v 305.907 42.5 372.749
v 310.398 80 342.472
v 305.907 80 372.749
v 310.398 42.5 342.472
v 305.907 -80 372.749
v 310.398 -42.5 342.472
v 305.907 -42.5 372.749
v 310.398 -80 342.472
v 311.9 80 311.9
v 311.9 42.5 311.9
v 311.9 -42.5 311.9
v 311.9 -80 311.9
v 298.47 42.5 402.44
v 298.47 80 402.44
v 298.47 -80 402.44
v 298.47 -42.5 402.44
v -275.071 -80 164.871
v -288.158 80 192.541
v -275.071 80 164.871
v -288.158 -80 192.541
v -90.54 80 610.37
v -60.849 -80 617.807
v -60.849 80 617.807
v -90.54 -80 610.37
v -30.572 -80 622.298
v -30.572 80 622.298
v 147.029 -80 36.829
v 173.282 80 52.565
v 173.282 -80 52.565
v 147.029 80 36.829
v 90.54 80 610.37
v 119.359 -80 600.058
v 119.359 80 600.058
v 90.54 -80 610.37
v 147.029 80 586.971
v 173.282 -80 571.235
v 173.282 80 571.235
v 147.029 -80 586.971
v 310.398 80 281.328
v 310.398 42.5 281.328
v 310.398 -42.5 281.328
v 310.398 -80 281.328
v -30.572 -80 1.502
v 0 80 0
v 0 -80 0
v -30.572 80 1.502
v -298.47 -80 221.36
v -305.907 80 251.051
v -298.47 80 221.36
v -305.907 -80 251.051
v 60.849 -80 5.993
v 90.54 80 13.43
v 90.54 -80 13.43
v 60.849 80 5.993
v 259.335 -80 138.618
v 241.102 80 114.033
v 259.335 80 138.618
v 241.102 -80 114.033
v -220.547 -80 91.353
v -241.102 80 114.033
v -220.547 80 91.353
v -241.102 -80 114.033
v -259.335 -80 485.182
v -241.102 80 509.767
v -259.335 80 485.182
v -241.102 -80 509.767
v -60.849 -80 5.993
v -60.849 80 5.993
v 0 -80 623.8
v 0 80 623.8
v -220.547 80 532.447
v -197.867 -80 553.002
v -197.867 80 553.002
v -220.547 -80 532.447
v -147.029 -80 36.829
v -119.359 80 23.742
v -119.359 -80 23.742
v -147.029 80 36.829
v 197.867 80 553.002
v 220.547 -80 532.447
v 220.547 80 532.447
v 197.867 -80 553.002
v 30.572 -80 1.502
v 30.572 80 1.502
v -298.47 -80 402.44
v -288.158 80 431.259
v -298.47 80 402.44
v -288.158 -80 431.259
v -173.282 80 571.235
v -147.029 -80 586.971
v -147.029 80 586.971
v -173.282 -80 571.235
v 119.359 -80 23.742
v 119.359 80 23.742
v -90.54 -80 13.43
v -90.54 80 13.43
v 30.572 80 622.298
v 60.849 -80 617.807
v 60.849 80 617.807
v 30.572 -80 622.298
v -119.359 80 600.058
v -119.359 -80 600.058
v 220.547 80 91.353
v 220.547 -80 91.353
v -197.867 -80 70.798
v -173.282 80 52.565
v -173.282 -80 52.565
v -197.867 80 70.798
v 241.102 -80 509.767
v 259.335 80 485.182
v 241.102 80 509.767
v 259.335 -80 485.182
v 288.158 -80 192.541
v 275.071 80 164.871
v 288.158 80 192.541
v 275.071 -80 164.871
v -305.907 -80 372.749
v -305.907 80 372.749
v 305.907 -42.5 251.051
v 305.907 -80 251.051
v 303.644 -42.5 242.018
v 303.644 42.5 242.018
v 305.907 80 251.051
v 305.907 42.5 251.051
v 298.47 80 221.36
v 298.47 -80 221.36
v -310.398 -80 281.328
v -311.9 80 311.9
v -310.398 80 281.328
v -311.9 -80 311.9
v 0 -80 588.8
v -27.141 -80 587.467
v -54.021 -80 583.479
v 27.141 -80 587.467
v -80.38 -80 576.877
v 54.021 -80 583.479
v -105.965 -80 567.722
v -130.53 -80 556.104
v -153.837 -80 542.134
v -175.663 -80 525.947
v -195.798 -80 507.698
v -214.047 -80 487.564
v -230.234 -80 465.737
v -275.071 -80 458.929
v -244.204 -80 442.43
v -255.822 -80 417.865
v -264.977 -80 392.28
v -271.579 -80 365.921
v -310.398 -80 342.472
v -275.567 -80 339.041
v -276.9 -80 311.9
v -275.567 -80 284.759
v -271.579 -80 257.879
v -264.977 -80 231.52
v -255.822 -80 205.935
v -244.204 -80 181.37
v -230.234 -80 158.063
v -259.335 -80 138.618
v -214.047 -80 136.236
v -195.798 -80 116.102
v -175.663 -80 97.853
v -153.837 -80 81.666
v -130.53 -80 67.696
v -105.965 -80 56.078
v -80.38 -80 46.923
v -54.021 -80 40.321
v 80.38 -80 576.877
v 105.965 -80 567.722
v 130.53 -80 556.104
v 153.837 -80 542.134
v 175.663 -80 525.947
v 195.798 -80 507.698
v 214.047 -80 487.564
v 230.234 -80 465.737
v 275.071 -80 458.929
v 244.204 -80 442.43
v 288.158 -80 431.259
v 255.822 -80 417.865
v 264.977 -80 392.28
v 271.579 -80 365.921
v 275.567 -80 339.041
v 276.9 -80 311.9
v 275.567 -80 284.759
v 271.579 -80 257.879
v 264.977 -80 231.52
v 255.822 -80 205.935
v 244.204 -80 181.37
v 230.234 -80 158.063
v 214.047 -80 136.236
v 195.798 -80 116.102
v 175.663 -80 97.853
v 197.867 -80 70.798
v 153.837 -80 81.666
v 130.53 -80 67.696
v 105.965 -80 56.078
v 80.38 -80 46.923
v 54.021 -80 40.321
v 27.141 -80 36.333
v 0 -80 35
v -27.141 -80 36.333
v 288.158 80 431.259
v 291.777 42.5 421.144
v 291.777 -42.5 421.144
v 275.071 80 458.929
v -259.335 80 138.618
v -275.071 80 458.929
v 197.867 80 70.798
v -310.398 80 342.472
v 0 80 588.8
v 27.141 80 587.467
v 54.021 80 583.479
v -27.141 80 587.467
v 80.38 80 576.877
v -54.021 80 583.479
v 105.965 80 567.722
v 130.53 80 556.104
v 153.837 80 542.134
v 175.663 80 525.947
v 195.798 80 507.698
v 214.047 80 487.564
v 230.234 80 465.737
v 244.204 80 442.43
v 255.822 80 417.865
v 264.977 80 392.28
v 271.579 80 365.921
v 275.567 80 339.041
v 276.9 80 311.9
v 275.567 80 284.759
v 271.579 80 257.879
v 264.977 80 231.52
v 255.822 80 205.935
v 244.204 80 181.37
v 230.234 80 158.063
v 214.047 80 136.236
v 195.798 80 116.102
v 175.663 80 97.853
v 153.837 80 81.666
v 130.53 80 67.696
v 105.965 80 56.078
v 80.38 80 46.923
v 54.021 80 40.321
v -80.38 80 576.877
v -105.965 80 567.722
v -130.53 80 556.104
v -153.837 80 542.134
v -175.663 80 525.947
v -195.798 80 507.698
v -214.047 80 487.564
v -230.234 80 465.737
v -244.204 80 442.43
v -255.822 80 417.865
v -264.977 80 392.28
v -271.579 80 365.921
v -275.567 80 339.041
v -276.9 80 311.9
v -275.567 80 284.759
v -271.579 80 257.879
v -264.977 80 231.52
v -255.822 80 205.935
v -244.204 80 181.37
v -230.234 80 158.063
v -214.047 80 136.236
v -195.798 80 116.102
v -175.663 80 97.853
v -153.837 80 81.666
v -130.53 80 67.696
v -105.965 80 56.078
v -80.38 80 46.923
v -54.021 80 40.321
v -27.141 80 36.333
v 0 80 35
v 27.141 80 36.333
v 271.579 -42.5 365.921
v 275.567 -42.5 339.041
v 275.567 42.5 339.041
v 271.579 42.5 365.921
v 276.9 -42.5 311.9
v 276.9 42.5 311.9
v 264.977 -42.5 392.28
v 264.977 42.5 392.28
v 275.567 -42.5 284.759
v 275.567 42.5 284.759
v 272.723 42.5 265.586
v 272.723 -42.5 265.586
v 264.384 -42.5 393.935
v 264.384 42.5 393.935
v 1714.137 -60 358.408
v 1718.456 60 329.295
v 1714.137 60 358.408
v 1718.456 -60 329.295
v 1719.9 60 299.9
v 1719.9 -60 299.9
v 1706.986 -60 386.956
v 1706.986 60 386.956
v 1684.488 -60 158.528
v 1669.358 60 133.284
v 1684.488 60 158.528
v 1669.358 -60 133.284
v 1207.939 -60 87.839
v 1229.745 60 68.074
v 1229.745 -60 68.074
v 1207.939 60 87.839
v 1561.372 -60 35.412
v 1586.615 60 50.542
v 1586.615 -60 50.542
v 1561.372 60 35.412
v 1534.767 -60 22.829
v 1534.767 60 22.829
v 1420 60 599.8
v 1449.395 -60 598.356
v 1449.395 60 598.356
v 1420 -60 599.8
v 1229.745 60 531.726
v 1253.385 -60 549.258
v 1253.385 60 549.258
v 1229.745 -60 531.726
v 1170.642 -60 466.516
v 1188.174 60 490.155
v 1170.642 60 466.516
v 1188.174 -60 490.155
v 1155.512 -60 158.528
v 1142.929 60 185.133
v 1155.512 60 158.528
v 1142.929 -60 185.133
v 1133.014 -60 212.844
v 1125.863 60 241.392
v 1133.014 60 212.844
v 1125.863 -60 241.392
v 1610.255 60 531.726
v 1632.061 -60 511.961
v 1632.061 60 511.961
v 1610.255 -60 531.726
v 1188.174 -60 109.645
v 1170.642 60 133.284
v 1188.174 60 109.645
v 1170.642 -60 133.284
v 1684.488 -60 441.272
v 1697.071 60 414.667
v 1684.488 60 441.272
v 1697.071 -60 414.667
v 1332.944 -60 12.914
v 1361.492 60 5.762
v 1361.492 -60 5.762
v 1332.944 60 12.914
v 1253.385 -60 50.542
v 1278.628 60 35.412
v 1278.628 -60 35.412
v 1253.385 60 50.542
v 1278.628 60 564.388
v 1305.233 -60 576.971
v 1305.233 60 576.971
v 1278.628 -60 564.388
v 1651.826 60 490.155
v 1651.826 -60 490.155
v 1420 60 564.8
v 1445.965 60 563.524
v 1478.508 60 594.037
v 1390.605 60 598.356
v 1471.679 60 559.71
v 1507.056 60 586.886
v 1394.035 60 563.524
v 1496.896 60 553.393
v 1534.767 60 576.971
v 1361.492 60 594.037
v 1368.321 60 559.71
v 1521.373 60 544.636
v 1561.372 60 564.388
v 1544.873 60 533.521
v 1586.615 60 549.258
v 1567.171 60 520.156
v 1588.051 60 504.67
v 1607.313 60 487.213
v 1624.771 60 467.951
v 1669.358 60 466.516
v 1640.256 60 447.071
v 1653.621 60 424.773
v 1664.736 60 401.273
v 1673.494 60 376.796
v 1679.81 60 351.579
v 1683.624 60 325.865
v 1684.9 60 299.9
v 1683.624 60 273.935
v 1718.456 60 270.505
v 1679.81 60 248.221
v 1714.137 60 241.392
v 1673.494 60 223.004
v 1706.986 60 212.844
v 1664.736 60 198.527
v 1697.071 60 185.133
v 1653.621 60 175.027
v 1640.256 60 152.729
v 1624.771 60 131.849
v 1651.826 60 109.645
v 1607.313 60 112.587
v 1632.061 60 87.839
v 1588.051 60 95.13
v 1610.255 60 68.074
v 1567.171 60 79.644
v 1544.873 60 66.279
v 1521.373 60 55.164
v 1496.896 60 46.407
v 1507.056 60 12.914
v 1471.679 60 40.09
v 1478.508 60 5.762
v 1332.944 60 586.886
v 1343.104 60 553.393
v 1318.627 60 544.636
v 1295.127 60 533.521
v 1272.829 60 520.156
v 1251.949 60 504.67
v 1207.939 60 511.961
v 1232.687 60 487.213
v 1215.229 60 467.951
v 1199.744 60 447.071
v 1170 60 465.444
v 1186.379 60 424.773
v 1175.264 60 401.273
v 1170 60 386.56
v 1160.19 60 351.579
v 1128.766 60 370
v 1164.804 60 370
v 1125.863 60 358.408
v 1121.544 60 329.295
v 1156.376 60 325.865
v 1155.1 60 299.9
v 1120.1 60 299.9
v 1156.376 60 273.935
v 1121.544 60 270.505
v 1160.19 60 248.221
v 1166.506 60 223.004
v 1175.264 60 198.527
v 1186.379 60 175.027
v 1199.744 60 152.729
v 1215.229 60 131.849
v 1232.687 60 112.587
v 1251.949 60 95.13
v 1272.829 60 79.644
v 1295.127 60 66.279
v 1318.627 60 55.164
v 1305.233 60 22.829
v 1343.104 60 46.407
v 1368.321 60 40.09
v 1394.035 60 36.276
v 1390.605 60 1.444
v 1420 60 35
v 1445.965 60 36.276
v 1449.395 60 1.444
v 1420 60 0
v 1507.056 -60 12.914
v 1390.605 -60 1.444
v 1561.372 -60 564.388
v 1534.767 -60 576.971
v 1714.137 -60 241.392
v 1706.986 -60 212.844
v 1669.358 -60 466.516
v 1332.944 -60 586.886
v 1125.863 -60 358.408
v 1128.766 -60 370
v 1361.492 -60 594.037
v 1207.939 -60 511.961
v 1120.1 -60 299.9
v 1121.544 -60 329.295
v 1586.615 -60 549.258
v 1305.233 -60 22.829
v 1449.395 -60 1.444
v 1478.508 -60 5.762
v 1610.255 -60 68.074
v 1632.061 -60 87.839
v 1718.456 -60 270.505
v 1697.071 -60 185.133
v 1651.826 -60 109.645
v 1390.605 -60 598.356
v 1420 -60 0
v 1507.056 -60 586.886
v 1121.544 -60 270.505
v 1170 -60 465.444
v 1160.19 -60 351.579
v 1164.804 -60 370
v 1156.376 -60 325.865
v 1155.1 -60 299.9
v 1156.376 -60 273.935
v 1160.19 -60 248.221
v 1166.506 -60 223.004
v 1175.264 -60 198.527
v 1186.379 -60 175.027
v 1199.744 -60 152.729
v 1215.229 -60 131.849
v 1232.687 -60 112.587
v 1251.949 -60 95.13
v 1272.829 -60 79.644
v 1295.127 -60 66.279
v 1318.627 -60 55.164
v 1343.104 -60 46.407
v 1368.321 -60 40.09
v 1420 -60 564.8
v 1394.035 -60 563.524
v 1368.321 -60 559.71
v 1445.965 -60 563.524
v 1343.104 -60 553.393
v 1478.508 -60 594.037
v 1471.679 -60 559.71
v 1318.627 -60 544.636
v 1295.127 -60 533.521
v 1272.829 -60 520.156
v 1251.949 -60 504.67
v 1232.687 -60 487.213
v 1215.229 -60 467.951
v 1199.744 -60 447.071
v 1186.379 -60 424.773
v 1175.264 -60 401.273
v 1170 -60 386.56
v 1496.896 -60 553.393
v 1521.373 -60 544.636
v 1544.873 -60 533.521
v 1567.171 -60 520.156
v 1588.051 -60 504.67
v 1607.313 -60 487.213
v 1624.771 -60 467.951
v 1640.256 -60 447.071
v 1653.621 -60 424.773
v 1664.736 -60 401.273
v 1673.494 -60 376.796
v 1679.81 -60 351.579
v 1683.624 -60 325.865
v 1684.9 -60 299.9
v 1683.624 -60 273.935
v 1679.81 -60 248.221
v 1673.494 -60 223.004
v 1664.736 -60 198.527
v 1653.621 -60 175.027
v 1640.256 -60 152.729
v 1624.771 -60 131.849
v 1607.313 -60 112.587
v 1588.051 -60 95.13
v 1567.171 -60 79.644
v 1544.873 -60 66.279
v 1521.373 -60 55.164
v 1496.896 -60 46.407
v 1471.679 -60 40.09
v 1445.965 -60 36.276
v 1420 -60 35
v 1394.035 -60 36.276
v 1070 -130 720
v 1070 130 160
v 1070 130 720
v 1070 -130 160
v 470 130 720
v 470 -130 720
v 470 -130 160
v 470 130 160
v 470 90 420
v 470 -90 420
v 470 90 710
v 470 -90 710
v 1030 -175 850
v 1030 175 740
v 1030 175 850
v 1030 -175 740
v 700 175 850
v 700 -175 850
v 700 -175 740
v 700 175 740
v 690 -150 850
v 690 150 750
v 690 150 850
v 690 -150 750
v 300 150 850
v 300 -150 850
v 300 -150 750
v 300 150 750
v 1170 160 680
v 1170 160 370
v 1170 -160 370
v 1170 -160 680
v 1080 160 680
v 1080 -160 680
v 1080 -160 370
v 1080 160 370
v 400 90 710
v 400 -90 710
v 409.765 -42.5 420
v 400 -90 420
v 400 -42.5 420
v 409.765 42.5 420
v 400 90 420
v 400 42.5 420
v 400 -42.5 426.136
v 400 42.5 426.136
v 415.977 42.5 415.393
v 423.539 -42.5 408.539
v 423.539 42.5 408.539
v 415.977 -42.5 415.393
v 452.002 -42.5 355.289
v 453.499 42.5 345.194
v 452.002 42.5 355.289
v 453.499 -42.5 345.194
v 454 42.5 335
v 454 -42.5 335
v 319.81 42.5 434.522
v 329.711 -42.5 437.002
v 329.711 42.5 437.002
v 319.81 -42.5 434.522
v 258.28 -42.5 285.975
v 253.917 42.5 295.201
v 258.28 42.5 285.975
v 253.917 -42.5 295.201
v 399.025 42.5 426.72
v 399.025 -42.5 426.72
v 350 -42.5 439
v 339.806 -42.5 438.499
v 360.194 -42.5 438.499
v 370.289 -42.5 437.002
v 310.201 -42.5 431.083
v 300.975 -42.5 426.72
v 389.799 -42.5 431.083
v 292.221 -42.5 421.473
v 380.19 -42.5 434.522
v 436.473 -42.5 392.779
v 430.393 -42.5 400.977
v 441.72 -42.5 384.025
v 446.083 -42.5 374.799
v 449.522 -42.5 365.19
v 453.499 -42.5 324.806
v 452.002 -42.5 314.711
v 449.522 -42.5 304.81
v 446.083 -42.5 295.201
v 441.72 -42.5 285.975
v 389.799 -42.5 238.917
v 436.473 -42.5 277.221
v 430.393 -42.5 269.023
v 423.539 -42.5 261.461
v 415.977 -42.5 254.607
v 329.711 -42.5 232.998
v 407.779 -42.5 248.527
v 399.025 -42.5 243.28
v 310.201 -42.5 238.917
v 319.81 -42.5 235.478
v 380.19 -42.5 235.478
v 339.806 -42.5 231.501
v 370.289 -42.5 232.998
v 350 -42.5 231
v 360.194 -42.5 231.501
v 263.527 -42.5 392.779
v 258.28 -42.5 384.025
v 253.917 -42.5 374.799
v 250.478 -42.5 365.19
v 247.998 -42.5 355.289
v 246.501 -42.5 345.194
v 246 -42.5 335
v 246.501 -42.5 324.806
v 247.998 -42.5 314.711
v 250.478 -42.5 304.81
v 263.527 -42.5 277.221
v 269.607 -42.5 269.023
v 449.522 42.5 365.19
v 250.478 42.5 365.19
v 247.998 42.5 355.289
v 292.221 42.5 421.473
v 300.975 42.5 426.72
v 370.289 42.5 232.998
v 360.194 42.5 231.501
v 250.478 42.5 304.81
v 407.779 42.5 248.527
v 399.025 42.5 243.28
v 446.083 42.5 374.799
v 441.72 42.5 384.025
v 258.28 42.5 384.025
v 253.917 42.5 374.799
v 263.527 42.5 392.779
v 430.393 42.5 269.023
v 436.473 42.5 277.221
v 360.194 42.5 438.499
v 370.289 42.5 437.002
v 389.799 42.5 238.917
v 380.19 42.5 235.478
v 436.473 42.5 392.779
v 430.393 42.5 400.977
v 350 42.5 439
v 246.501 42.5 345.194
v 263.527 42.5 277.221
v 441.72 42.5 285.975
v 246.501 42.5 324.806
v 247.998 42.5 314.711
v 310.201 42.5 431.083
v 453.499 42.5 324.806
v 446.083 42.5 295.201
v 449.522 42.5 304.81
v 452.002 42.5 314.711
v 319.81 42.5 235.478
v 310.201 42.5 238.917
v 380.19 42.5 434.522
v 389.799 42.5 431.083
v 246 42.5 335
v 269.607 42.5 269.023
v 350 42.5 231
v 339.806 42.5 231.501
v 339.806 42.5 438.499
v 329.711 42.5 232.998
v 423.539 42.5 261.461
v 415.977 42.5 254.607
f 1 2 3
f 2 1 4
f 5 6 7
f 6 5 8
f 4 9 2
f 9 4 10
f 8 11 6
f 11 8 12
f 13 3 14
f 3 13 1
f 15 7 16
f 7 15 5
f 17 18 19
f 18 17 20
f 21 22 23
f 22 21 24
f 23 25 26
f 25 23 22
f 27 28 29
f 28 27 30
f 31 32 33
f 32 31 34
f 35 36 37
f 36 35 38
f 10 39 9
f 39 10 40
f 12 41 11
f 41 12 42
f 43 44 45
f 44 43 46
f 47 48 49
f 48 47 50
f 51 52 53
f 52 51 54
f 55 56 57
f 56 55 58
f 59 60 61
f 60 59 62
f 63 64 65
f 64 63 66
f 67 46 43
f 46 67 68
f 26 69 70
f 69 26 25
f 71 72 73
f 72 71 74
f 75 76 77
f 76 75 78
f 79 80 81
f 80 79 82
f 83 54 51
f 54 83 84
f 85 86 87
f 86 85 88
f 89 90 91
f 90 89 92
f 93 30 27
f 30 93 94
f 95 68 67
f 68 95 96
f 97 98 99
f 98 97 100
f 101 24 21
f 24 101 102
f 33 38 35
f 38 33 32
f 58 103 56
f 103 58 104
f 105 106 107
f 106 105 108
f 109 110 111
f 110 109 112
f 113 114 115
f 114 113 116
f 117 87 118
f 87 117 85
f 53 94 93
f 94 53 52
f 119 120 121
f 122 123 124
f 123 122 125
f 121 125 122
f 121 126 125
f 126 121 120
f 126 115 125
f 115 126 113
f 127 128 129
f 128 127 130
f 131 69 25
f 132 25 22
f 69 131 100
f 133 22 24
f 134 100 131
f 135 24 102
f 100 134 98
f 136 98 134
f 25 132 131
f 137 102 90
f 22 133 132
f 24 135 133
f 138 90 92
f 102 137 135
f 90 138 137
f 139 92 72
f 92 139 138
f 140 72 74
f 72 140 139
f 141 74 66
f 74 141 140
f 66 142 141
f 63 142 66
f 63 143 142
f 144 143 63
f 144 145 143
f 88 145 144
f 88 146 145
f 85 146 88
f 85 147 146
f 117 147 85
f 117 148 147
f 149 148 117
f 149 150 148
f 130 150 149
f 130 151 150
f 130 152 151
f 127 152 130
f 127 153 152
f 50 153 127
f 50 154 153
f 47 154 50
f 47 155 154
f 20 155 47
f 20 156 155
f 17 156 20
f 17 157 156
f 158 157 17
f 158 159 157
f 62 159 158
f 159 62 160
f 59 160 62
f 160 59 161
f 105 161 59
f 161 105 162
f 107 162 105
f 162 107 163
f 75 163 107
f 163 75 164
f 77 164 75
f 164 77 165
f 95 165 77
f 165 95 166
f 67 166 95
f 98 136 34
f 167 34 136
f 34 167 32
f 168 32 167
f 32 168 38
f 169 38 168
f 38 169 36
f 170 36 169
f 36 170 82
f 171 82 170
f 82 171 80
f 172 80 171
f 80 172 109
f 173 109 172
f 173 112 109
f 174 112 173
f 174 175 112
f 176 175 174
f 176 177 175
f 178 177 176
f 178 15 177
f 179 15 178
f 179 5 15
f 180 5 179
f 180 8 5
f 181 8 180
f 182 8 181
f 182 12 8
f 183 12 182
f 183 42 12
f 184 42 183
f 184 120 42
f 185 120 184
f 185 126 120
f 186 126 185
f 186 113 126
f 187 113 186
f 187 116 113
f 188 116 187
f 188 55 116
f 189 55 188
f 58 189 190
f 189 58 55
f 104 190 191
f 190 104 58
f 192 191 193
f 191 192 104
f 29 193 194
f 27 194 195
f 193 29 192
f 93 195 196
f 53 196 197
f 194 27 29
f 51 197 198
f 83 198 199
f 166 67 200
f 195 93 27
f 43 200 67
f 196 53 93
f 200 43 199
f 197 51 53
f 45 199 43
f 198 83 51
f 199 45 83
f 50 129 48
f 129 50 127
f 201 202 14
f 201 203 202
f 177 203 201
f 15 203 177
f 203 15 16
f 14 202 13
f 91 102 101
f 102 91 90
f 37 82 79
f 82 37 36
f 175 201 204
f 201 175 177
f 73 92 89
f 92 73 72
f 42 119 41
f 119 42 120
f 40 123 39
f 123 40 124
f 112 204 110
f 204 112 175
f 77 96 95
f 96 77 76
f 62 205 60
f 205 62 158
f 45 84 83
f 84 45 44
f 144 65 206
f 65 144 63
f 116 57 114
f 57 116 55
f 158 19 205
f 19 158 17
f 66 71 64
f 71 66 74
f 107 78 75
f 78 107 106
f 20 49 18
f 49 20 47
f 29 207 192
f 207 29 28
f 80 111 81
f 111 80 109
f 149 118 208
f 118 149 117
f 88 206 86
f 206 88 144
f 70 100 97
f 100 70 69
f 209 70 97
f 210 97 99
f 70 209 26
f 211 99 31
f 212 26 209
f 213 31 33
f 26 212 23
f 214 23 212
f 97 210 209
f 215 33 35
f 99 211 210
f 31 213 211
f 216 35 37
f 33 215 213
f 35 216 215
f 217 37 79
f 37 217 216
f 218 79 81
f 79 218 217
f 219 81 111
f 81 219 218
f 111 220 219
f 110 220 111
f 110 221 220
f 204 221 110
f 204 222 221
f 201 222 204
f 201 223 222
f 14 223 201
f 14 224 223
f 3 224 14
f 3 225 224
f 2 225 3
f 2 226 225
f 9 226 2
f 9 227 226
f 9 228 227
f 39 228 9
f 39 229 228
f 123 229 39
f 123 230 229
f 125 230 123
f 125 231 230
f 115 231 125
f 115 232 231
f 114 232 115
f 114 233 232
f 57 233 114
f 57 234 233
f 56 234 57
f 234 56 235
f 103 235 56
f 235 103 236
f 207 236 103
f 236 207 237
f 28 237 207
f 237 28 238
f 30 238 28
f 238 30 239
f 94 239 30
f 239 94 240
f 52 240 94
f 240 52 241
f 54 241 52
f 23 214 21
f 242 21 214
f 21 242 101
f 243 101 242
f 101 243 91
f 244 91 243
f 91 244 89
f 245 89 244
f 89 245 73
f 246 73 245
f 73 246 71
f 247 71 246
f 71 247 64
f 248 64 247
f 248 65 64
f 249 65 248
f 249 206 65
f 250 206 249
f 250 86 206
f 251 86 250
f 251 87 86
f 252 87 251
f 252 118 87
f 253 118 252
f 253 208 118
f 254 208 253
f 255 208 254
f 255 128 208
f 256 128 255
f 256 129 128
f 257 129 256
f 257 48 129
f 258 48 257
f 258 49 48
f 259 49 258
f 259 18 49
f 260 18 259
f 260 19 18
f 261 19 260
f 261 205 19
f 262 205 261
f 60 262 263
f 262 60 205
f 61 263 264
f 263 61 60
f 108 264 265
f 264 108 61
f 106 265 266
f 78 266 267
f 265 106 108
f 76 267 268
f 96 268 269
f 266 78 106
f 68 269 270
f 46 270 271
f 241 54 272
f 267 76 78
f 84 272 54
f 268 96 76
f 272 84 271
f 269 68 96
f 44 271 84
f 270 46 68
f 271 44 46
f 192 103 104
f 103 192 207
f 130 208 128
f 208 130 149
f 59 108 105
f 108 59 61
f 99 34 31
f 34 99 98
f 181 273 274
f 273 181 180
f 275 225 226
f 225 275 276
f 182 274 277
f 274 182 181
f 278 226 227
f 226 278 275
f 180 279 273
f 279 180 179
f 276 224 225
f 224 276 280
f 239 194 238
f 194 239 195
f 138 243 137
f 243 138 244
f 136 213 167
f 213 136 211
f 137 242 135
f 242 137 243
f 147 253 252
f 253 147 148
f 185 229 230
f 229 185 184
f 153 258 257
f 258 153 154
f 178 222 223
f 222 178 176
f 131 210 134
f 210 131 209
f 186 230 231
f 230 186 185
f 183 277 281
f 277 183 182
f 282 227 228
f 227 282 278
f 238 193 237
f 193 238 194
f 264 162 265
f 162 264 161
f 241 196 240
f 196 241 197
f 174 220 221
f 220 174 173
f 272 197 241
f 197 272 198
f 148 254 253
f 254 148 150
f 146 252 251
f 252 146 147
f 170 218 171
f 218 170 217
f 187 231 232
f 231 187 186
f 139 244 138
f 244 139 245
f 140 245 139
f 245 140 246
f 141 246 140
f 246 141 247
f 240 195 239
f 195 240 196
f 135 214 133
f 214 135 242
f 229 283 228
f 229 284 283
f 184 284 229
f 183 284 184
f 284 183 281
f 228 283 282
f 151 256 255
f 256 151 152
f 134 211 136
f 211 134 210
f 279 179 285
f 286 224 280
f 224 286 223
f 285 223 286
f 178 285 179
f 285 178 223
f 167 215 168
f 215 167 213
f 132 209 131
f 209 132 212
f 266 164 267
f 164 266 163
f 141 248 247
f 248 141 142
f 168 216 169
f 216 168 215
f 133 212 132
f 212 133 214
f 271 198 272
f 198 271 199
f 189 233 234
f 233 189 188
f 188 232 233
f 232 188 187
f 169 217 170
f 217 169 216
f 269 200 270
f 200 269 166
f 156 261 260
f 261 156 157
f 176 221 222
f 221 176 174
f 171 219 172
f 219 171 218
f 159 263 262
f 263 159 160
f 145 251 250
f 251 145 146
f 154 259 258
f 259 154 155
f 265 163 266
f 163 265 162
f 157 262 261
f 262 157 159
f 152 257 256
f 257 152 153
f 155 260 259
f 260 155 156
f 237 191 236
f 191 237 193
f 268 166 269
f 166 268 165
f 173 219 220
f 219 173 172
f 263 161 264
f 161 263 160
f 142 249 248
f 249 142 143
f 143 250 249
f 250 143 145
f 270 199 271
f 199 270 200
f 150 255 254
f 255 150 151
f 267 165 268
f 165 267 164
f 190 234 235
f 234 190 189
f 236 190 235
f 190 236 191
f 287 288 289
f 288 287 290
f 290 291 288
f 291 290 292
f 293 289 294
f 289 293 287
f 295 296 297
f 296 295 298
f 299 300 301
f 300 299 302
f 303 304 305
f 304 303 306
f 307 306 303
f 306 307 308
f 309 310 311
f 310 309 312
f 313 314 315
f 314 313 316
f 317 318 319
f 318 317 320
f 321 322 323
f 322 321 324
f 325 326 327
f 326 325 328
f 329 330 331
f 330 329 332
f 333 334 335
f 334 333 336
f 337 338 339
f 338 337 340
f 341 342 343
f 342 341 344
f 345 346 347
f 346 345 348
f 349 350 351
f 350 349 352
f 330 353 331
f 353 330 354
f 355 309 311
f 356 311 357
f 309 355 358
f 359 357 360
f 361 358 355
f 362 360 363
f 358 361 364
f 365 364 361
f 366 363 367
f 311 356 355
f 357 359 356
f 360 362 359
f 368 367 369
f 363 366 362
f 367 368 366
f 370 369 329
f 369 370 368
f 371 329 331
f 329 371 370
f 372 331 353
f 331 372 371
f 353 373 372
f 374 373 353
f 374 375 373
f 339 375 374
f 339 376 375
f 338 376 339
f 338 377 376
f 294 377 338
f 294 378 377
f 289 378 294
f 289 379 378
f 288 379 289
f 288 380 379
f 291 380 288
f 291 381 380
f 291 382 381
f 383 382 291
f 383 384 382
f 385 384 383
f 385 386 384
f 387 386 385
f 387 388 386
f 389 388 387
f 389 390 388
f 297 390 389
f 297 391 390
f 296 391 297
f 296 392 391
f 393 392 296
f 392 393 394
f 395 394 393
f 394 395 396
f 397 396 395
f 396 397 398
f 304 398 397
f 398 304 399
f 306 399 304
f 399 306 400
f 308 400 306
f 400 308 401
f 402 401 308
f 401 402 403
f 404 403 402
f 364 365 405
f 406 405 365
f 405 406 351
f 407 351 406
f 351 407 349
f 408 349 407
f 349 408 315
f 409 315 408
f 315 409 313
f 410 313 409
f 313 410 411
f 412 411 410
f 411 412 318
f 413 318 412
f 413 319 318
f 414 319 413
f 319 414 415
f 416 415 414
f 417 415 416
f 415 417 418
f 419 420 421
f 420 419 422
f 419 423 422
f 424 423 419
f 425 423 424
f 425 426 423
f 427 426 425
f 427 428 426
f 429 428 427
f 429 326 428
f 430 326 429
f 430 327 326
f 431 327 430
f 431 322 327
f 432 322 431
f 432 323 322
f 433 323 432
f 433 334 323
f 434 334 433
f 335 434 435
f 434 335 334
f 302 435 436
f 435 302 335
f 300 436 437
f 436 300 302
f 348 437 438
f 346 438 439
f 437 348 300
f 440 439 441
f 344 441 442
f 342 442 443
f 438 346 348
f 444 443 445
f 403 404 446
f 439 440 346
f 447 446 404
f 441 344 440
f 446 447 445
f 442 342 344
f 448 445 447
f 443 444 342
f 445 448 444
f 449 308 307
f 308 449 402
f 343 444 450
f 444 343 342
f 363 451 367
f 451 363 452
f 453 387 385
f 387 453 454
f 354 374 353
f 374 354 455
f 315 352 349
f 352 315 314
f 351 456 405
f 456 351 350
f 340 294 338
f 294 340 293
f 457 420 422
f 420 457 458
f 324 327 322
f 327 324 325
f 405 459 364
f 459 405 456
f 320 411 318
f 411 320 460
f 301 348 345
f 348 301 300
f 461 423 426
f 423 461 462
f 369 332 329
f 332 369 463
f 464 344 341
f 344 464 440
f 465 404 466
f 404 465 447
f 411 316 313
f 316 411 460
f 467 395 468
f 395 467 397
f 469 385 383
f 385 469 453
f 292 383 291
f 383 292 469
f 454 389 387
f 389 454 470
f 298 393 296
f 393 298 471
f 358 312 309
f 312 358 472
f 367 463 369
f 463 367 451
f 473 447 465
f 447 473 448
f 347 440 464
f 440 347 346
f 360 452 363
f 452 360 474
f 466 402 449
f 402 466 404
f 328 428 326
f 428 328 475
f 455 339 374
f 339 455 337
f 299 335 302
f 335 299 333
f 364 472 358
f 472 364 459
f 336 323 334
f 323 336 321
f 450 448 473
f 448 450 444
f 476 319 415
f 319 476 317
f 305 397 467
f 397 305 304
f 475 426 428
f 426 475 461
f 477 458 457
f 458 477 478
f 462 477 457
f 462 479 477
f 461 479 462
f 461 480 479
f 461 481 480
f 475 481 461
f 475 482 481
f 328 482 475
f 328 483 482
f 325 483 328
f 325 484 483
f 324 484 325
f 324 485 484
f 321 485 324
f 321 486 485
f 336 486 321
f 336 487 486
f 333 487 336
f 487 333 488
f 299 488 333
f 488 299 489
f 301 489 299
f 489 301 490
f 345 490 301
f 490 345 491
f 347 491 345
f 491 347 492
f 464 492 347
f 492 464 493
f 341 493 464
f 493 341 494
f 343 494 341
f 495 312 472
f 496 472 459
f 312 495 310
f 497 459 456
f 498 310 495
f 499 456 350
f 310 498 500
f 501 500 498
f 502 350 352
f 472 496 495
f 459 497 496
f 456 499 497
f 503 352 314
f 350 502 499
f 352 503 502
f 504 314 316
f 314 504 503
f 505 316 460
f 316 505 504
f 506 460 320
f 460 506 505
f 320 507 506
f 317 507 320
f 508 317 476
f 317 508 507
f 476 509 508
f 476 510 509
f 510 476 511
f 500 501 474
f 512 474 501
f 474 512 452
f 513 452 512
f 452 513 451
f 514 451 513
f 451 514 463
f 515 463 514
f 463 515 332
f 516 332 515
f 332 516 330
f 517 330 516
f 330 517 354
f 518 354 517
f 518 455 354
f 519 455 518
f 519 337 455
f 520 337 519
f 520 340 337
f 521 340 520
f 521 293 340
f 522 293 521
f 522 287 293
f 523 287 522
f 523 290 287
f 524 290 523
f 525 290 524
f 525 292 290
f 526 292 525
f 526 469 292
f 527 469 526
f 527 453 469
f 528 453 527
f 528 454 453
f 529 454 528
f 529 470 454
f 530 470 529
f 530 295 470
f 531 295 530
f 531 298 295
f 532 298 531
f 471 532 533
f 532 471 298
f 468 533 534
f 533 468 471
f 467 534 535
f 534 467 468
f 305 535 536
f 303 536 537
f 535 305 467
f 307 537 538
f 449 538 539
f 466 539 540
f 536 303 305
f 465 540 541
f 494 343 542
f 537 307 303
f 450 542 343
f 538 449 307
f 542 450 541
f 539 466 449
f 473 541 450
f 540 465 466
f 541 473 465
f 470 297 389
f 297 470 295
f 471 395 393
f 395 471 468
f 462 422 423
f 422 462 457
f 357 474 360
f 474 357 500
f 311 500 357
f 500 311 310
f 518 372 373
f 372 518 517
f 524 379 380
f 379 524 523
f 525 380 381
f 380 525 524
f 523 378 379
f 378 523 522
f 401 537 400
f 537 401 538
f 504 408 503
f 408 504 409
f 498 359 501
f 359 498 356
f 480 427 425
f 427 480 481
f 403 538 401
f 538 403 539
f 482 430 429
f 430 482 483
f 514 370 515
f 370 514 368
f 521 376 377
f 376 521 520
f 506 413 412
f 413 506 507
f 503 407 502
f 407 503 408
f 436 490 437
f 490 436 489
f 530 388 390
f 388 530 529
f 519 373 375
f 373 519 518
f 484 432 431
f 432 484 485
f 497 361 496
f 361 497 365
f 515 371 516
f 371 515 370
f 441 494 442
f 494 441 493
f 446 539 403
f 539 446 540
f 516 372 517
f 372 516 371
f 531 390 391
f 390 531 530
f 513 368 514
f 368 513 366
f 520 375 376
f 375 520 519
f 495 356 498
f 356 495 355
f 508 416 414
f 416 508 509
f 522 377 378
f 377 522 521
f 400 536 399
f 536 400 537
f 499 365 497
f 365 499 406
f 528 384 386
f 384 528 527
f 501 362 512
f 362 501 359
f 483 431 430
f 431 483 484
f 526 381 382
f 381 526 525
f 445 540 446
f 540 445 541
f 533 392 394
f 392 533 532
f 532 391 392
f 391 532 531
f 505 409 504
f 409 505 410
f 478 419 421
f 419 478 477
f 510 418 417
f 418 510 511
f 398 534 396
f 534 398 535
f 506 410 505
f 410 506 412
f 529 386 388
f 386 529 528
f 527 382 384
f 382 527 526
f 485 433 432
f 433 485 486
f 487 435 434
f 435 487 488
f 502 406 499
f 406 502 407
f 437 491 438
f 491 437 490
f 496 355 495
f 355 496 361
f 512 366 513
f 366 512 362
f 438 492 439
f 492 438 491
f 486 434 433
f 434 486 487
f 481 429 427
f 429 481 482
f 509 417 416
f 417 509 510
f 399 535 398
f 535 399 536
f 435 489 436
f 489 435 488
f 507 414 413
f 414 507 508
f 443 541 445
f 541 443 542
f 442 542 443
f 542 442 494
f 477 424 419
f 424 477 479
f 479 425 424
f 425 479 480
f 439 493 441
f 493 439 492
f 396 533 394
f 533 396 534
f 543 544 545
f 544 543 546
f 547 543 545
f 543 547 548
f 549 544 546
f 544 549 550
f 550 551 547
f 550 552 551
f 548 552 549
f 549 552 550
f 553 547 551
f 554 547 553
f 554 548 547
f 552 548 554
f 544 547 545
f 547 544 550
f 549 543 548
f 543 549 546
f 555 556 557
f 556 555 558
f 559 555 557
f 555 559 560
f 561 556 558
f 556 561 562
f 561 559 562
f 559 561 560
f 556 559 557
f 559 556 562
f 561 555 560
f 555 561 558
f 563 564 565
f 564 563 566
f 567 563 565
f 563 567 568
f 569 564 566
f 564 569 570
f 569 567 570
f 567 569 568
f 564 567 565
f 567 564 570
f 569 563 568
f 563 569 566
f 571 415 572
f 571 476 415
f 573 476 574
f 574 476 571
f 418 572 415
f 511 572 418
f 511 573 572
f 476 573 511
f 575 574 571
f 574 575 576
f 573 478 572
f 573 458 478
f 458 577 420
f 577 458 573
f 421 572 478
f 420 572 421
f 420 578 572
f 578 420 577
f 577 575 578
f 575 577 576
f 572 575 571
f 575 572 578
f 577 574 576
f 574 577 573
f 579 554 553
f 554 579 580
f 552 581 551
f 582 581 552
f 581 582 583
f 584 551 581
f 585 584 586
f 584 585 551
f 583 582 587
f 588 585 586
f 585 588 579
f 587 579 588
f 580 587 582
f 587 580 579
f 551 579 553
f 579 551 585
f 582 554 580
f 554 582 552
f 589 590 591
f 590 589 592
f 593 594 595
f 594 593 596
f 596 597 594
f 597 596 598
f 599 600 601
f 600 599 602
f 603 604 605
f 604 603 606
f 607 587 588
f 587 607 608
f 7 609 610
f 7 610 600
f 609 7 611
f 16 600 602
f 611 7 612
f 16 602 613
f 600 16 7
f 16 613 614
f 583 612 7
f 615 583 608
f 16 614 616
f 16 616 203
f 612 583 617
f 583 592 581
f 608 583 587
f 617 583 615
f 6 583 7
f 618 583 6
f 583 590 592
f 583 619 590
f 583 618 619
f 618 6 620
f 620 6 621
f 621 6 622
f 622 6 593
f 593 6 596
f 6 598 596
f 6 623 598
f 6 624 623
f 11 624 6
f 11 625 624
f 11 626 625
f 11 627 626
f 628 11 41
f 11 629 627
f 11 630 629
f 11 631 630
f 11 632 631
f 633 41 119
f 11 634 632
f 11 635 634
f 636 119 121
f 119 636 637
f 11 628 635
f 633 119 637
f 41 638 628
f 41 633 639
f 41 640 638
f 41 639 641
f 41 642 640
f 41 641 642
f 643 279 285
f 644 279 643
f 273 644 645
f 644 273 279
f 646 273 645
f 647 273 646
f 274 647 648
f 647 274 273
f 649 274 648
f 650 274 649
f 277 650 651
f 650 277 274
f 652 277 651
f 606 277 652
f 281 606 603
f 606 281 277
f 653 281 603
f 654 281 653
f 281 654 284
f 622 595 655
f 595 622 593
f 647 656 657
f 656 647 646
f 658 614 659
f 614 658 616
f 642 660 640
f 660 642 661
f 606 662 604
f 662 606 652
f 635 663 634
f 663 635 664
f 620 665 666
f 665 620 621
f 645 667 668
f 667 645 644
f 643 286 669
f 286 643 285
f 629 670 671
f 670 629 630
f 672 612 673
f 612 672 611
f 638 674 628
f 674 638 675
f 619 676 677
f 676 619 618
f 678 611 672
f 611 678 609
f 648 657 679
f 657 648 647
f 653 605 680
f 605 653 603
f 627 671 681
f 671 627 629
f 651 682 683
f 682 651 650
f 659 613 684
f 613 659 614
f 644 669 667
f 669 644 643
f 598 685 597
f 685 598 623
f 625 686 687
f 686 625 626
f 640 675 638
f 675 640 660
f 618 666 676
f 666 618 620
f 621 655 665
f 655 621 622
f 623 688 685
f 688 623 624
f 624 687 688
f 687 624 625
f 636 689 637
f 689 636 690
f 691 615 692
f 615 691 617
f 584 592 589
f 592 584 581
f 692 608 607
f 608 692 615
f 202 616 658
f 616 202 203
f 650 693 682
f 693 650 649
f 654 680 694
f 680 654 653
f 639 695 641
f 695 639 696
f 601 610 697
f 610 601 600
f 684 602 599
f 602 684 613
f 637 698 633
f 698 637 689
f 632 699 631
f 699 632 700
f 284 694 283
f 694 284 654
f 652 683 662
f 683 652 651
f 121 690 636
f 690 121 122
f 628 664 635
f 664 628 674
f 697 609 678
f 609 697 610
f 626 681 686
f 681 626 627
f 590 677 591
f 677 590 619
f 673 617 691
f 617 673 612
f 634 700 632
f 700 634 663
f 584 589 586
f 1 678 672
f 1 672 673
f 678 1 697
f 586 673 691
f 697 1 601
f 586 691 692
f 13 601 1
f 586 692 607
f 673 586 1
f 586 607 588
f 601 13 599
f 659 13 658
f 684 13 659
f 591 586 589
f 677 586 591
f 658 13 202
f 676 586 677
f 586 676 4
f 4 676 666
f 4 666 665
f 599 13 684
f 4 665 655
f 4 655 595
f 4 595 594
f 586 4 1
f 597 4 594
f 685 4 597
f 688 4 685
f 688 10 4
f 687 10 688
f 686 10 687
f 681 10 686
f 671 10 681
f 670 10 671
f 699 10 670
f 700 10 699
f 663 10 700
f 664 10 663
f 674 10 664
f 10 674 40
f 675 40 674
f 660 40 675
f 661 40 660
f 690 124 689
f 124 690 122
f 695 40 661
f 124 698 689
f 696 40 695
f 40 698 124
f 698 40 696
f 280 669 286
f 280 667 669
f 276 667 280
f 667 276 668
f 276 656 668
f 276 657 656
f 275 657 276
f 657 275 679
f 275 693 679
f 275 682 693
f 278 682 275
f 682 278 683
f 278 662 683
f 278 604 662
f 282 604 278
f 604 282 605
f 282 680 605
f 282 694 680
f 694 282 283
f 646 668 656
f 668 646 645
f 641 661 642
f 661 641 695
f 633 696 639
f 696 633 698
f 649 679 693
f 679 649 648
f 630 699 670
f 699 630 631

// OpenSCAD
// B0 packaging reservations, mm. NOT fabrication CAD. Generated by build-development-model.py.
$fn=64;
module box(p,s,c){color(c,0.55) translate(p) cube(s);}
module wheel(x,z,w,r){color([0.12,0.15,0.19]) translate([x,w/2,z]) rotate([90,0,0]) difference(){cylinder(h=w,r=r);translate([0,0,-1]) cylinder(h=w+2,r=r-35);}}
wheel(0,311.9,160,311.9); wheel(1420,299.9,120,299.9);
// PKG01: Battery reservation; Earlier 87.36 L reservation; not a validated pack
box([470,-130,160],[600,260,560],[0.9411764705882353, 0.7019607843137254, 0.30980392156862746]);
// PKG02: Inverter reservation; Body plus installation allowance; orientation speculative
box([700,-175,740],[330,350,110],[0.396078431372549, 0.7137254901960784, 0.8588235294117647]);
// PKG03: OBC reservation; Compact charger body plus services; not selected
box([300,-150,750],[390,300,100],[0.49019607843137253, 0.8274509803921568, 0.6901960784313725]);
// PKG04: Front radiator study; Unsized heat exchanger/fan reservation
box([1080,-160,370],[90,320,310],[0.9333333333333333, 0.5568627450980392, 0.6078431372549019]);
// PKG05: Rear shock/linkage keepout; Unsolved linkage path; not supplier dimensions
box([400,-90,420],[190,180,290],[0.8117647058823529, 0.6431372549019608, 0.9098039215686274]);
color("orange") translate([350,42.5,335]) rotate([90,0,0]) cylinder(h=85,d=208);
color("red") translate([550,0,390]) sphere(r=25); // pivot center conflict
// Add real CAD and swept motion before any fit claim.
